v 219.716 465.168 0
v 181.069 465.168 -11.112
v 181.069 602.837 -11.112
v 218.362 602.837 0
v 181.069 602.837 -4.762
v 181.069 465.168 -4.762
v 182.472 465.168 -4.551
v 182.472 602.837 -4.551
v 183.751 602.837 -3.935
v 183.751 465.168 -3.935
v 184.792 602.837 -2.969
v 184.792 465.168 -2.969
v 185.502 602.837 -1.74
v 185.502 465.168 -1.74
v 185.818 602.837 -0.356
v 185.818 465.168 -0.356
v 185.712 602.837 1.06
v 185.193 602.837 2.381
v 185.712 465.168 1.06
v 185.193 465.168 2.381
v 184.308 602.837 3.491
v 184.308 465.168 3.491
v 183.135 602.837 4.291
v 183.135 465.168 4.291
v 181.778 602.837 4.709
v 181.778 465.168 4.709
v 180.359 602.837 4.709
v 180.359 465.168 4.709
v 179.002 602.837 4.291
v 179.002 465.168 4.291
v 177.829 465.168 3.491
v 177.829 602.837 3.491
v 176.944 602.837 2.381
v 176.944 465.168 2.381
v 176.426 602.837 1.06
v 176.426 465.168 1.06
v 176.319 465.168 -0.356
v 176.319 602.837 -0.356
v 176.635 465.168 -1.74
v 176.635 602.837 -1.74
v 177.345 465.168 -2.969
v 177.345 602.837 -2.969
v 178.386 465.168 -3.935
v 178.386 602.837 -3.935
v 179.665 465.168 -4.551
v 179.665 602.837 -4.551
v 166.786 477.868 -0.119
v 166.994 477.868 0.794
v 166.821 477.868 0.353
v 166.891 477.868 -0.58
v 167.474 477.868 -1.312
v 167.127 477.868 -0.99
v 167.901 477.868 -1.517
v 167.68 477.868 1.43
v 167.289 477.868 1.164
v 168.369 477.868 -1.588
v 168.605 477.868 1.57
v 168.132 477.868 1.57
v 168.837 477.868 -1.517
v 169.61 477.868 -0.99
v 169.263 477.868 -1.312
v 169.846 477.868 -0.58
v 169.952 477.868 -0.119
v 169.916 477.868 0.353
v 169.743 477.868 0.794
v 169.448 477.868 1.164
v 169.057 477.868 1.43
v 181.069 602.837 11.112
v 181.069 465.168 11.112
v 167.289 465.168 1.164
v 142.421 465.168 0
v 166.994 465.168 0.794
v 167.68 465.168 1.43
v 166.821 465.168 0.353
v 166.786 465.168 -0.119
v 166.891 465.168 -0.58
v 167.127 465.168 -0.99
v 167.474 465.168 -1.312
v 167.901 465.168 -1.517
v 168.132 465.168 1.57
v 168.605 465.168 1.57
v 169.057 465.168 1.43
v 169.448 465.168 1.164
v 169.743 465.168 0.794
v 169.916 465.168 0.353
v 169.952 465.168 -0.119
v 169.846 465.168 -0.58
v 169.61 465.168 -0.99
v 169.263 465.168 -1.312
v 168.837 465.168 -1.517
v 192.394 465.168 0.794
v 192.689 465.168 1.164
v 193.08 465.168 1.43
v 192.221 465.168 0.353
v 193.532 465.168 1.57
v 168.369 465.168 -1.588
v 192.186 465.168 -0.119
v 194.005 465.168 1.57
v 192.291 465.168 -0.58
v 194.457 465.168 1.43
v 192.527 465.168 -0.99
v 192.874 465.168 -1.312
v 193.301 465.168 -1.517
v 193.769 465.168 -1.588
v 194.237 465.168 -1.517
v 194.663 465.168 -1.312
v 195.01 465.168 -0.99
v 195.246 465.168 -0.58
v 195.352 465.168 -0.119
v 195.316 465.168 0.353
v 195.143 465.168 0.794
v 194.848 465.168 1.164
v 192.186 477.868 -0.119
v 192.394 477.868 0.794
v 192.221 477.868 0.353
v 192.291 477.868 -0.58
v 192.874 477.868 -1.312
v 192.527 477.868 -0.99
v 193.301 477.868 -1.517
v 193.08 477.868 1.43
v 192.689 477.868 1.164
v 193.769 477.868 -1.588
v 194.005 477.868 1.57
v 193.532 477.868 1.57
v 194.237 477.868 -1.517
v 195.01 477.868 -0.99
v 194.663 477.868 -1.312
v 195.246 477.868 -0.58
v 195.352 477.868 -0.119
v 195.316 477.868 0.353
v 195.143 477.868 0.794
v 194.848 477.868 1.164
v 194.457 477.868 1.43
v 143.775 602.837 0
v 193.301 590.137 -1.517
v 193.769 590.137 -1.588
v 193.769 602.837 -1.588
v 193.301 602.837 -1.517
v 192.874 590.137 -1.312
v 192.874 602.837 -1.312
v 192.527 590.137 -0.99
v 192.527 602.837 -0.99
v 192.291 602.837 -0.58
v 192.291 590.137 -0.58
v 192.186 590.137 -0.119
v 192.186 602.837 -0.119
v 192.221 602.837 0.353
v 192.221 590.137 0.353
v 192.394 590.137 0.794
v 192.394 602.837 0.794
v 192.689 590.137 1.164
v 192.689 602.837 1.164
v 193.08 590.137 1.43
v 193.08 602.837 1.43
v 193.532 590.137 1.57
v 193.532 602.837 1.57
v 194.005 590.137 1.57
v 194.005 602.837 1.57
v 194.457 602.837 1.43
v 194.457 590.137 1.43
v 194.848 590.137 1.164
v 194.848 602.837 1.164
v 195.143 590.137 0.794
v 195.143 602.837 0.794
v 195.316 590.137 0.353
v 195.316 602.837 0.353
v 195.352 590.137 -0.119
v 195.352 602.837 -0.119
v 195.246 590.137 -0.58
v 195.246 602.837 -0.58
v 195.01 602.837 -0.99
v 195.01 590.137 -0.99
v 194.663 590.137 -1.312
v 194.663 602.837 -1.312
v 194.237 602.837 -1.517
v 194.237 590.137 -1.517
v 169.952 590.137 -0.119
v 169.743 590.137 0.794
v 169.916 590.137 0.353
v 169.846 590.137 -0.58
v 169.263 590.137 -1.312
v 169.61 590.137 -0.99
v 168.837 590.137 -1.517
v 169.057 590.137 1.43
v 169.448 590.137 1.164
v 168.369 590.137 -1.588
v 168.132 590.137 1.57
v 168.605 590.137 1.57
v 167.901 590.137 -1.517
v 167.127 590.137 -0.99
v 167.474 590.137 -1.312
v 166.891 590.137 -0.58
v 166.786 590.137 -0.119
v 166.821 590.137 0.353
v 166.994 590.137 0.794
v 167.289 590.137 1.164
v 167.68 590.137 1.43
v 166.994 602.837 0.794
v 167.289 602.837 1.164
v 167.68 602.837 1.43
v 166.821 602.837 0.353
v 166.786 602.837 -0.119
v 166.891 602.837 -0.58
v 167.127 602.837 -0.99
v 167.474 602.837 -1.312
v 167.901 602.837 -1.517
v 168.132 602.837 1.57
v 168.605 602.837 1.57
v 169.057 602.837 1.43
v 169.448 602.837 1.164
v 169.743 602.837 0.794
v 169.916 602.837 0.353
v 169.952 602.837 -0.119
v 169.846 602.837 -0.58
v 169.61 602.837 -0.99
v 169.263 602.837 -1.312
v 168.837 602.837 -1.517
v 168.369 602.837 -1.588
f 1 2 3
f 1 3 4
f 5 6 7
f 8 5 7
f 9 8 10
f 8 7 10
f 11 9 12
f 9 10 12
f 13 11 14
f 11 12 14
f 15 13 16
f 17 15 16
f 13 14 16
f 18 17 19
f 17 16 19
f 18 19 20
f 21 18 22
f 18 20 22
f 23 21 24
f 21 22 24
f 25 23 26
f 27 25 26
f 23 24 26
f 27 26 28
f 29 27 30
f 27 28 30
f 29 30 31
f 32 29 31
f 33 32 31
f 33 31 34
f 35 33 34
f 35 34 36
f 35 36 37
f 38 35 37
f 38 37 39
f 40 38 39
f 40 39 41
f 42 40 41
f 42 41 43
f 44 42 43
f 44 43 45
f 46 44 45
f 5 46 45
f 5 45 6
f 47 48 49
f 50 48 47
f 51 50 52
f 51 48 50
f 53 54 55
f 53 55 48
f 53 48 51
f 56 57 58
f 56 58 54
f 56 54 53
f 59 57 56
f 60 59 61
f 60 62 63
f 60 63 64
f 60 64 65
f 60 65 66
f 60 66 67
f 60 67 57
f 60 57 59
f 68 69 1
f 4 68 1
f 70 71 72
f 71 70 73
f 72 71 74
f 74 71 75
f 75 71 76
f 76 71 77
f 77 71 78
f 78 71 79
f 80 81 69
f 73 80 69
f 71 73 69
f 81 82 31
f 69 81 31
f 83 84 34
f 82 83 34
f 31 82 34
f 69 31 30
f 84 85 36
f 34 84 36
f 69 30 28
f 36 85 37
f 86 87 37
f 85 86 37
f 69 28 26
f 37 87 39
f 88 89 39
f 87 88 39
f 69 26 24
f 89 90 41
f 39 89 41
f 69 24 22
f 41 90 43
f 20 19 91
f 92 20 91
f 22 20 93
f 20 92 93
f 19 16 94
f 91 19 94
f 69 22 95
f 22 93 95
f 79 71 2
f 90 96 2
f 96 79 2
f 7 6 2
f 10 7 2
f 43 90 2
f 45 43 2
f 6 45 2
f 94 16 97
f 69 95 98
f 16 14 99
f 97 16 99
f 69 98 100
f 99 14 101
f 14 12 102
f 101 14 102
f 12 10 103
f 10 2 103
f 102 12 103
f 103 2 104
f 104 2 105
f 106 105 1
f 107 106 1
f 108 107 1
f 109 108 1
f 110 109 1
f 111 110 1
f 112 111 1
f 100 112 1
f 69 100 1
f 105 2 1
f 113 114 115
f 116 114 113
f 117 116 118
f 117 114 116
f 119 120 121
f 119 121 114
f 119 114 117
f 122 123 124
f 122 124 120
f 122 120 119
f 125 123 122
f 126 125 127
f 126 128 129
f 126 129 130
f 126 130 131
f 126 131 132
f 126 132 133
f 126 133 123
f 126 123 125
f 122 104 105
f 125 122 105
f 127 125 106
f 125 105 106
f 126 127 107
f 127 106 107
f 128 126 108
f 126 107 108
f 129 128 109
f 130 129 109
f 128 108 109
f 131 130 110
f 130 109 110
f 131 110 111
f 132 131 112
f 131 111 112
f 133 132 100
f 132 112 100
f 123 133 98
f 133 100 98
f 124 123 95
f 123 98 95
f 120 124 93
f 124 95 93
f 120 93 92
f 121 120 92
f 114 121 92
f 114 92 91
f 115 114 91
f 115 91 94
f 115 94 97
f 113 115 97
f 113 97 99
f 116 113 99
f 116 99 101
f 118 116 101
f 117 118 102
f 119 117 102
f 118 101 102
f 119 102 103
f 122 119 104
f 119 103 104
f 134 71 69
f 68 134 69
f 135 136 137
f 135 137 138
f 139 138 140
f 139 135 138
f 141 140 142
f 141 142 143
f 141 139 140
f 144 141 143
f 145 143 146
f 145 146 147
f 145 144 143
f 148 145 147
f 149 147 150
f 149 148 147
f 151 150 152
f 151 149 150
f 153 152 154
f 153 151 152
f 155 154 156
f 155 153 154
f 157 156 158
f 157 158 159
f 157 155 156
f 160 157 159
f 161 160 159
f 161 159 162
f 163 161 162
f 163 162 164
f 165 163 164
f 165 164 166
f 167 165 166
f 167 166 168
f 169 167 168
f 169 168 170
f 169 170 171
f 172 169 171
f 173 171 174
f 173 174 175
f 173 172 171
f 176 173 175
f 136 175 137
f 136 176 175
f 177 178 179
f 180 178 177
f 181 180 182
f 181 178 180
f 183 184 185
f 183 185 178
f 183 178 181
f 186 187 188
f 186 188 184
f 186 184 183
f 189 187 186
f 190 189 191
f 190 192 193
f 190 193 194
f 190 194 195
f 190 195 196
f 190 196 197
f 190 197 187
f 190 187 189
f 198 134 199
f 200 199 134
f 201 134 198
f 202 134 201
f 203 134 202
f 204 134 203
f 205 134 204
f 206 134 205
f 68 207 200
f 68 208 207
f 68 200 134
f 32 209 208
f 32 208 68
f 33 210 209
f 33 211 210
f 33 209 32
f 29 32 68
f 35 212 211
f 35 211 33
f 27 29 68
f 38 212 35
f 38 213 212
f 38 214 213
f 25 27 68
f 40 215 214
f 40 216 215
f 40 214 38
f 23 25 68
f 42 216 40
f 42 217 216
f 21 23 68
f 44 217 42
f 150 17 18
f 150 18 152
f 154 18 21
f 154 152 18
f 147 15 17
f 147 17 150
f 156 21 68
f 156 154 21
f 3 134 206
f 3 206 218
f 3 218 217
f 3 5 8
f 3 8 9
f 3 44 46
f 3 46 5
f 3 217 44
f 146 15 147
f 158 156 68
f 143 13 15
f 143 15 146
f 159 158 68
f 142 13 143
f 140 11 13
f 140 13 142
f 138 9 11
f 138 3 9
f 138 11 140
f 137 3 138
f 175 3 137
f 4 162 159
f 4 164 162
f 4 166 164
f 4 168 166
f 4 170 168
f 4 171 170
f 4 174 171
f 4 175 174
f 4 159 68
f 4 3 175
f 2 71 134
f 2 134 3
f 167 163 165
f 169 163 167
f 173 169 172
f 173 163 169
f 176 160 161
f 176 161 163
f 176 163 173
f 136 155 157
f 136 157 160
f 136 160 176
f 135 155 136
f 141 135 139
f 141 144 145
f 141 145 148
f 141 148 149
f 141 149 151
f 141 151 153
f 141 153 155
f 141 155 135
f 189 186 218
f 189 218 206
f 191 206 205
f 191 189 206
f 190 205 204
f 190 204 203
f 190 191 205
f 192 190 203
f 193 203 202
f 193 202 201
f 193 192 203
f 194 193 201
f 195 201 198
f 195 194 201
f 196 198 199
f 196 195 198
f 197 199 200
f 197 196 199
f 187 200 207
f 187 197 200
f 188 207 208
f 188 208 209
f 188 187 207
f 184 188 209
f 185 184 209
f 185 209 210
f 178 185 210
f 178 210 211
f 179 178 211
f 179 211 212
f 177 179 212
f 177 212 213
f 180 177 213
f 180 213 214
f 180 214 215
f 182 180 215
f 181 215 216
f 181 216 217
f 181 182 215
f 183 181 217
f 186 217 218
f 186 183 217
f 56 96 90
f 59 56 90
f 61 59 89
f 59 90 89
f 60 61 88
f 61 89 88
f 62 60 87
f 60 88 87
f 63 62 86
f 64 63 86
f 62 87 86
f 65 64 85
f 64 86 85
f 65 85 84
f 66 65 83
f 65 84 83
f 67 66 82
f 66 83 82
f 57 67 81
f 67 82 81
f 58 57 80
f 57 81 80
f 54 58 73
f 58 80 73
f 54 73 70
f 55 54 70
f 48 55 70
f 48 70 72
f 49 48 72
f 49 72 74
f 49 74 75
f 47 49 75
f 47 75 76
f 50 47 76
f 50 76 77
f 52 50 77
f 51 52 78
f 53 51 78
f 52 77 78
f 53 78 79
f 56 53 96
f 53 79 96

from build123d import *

# Parameters (mm, degrees)
BOSS_EXTRUDE1_DEPTH      = 11.1125
BOSS_EXTRUDE1_DEPTH_BACK = 11.1125
SKETCH5_W                = 109.877468776
SKETCH5_H                = 283.051122129
CUT_EXTRUDE2_DEPTH       = 1193.492852366
SKETCH6_W                = 149.121482991
SKETCH6_H                = 108.921761737
CUT_EXTRUDE3_DEPTH       = 1175.662940665
SKETCH7_R                = 4.7625
CUT_EXTRUDE4_DEPTH       = 635
CUT_EXTRUDE5_DEPTH       = 1195.766301895
CUT_EXTRUDE5_DEPTH_BACK  = 1195.766301895
SKETCH8_W                = 149.774750394
SKETCH8_H                = 142.875
SKETCH8_H_2              = 176.125878949
SKETCH9_R                = 1.5875
CUT_EXTRUDE6_DEPTH       = 12.7
CUT_EXTRUDE7_START       = -12.7
SKETCH10_R               = 1.5875
CUT_EXTRUDE7_DEPTH       = 12.7


with BuildPart() as part:
    # Sketch1 → Boss-Extrude1 (new, two sides: drawn at the far end of the back side and taken through both)
    with BuildSketch(Plane.XY.offset(-BOSS_EXTRUDE1_DEPTH_BACK)):
        Polygon((142.42123069, 465.168027231), (219.716026672, 465.168027231), (213.502471629, 1096.967634552), (181.068628681, 1174.337215652), (148.634785732, 1096.967634552), align=None)
    extrude(amount=BOSS_EXTRUDE1_DEPTH + BOSS_EXTRUDE1_DEPTH_BACK)

    # Sketch2 → Cut-Loft1 section 0
    with BuildSketch(Plane.XZ.offset(-465.168027231)):
        with BuildLine():
            Line((142.42123069, 0), (181.068628681, 11.1125))
            Line((181.068628681, 11.1125), (219.716026672, 0))
            Line((219.716026672, 0), (222.70513775, 0))
            Line((222.70513775, 0), (222.70513775, 15.258366339))
            Line((222.70513775, 15.258366339), (137.848628215, 15.258366339))
            Line((137.848628215, 15.258366339), (137.848628215, 0))
            Line((137.848628215, 0), (142.42123069, 0))
        make_face()
    # Sketch3 → Cut-Loft1 section 1
    with BuildSketch(Plane(origin=(0, 1096.967634552, 0), x_dir=(1, 0, 0), z_dir=(0, 1, 0))):
        with BuildLine():
            Line((213.502471629, 0), (181.068628681, -11.1125))
            Line((181.068628681, -11.1125), (148.634785732, 0))
            Line((148.634785732, 0), (137.848628215, 0))
            Line((137.848628215, 0), (137.848628215, -15.258366339))
            Line((137.848628215, -15.258366339), (222.70513775, -15.258366339))
            Line((222.70513775, -15.258366339), (222.70513775, 0))
            Line((222.70513775, 0), (213.502471629, 0))
        make_face()
    cut_loft1 = loft(mode=Mode.SUBTRACT)

    # Mirror1: Cut-Loft1 across plane
    add(cut_loft1.mirror(Plane.XY), mode=Mode.SUBTRACT)

    # Sketch5 → Cut-Extrude2 (cut, through all)
    with BuildSketch(Plane(origin=(-32.103098407, 13.457832356, 93.698704331), x_dir=(0.9470206004067627, 0.045661094409327196, 0.31791043842968925), z_dir=(-0.3211728232668741, 0.1346377834927197, 0.937401026696127))):
        with Locations((219.349244299, 1139.303724701)):
            Rectangle(SKETCH5_W, SKETCH5_H)
    cut_extrude2 = extrude(amount=CUT_EXTRUDE2_DEPTH, mode=Mode.SUBTRACT)

    # Sketch6 → Cut-Extrude3 (cut, through all)
    with BuildSketch(Plane(origin=(69.458274406, 29.117370568, 202.726547902), x_dir=(0.9470206004067623, -0.045661094409327495, -0.31791043842969063), z_dir=(0.3211728232668754, 0.13463778349272, 0.9374010266961263))):
        with Locations((131.752816965, 1118.922251835)):
            Rectangle(SKETCH6_W, SKETCH6_H)
    cut_extrude3 = extrude(amount=CUT_EXTRUDE3_DEPTH, mode=Mode.SUBTRACT)

    # Mirror2: Cut-Extrude2, Cut-Extrude3 across plane
    add(cut_extrude2.mirror(Plane.XY), mode=Mode.SUBTRACT)
    add(cut_extrude3.mirror(Plane.XY), mode=Mode.SUBTRACT)

    # Sketch7 → Cut-Extrude4 (cut)
    with BuildSketch(Plane.XZ.offset(-465.168027231)):
        with Locations(Location((181.068628681, 0, 0), (0, 0, 270))):
            Circle(SKETCH7_R)
    extrude(amount=-CUT_EXTRUDE4_DEPTH, mode=Mode.SUBTRACT)

    # Sketch8 → Cut-Extrude5 (cut, two sides: drawn at the far end of the back side and taken through both)
    with BuildSketch(Plane.XY.offset(-CUT_EXTRUDE5_DEPTH_BACK)):
        with Locations((180.5976389, 674.274715652)):
            Rectangle(SKETCH8_W, SKETCH8_H)
        with Locations((180.5976389, 817.149715652)):
            Rectangle(SKETCH8_W, SKETCH8_H)
        with Locations((180.5976389, 960.024715652)):
            Rectangle(SKETCH8_W, SKETCH8_H)
        with Locations((180.5976389, 1119.525155127)):
            Rectangle(SKETCH8_W, SKETCH8_H_2)
    extrude(amount=CUT_EXTRUDE5_DEPTH + CUT_EXTRUDE5_DEPTH_BACK, mode=Mode.SUBTRACT)

    # Sketch9 → Cut-Extrude6 (cut)
    with BuildSketch(Plane.XZ.offset(-465.168027231)):
        with Locations(Location((168.368628681, 0, 0), (0, 0, 270))):
            Circle(SKETCH9_R)
        with Locations(Location((193.768628681, 0, 0), (0, 0, 270))):
            Circle(SKETCH9_R)
    extrude(amount=-CUT_EXTRUDE6_DEPTH, mode=Mode.SUBTRACT)

    # Sketch10 → Cut-Extrude7 (cut)
    with BuildSketch(Plane(origin=(0, 602.837215652, 0), x_dir=(1, 0, 0), z_dir=(0, 1, 0)).offset(CUT_EXTRUDE7_START)):
        with Locations(Location((168.368628681, 0, 0), (0, 0, 90))):
            Circle(SKETCH10_R)
        with Locations(Location((193.768628681, 0, 0), (0, 0, 90))):
            Circle(SKETCH10_R)
    extrude(amount=CUT_EXTRUDE7_DEPTH, mode=Mode.SUBTRACT)


solid = part.part
